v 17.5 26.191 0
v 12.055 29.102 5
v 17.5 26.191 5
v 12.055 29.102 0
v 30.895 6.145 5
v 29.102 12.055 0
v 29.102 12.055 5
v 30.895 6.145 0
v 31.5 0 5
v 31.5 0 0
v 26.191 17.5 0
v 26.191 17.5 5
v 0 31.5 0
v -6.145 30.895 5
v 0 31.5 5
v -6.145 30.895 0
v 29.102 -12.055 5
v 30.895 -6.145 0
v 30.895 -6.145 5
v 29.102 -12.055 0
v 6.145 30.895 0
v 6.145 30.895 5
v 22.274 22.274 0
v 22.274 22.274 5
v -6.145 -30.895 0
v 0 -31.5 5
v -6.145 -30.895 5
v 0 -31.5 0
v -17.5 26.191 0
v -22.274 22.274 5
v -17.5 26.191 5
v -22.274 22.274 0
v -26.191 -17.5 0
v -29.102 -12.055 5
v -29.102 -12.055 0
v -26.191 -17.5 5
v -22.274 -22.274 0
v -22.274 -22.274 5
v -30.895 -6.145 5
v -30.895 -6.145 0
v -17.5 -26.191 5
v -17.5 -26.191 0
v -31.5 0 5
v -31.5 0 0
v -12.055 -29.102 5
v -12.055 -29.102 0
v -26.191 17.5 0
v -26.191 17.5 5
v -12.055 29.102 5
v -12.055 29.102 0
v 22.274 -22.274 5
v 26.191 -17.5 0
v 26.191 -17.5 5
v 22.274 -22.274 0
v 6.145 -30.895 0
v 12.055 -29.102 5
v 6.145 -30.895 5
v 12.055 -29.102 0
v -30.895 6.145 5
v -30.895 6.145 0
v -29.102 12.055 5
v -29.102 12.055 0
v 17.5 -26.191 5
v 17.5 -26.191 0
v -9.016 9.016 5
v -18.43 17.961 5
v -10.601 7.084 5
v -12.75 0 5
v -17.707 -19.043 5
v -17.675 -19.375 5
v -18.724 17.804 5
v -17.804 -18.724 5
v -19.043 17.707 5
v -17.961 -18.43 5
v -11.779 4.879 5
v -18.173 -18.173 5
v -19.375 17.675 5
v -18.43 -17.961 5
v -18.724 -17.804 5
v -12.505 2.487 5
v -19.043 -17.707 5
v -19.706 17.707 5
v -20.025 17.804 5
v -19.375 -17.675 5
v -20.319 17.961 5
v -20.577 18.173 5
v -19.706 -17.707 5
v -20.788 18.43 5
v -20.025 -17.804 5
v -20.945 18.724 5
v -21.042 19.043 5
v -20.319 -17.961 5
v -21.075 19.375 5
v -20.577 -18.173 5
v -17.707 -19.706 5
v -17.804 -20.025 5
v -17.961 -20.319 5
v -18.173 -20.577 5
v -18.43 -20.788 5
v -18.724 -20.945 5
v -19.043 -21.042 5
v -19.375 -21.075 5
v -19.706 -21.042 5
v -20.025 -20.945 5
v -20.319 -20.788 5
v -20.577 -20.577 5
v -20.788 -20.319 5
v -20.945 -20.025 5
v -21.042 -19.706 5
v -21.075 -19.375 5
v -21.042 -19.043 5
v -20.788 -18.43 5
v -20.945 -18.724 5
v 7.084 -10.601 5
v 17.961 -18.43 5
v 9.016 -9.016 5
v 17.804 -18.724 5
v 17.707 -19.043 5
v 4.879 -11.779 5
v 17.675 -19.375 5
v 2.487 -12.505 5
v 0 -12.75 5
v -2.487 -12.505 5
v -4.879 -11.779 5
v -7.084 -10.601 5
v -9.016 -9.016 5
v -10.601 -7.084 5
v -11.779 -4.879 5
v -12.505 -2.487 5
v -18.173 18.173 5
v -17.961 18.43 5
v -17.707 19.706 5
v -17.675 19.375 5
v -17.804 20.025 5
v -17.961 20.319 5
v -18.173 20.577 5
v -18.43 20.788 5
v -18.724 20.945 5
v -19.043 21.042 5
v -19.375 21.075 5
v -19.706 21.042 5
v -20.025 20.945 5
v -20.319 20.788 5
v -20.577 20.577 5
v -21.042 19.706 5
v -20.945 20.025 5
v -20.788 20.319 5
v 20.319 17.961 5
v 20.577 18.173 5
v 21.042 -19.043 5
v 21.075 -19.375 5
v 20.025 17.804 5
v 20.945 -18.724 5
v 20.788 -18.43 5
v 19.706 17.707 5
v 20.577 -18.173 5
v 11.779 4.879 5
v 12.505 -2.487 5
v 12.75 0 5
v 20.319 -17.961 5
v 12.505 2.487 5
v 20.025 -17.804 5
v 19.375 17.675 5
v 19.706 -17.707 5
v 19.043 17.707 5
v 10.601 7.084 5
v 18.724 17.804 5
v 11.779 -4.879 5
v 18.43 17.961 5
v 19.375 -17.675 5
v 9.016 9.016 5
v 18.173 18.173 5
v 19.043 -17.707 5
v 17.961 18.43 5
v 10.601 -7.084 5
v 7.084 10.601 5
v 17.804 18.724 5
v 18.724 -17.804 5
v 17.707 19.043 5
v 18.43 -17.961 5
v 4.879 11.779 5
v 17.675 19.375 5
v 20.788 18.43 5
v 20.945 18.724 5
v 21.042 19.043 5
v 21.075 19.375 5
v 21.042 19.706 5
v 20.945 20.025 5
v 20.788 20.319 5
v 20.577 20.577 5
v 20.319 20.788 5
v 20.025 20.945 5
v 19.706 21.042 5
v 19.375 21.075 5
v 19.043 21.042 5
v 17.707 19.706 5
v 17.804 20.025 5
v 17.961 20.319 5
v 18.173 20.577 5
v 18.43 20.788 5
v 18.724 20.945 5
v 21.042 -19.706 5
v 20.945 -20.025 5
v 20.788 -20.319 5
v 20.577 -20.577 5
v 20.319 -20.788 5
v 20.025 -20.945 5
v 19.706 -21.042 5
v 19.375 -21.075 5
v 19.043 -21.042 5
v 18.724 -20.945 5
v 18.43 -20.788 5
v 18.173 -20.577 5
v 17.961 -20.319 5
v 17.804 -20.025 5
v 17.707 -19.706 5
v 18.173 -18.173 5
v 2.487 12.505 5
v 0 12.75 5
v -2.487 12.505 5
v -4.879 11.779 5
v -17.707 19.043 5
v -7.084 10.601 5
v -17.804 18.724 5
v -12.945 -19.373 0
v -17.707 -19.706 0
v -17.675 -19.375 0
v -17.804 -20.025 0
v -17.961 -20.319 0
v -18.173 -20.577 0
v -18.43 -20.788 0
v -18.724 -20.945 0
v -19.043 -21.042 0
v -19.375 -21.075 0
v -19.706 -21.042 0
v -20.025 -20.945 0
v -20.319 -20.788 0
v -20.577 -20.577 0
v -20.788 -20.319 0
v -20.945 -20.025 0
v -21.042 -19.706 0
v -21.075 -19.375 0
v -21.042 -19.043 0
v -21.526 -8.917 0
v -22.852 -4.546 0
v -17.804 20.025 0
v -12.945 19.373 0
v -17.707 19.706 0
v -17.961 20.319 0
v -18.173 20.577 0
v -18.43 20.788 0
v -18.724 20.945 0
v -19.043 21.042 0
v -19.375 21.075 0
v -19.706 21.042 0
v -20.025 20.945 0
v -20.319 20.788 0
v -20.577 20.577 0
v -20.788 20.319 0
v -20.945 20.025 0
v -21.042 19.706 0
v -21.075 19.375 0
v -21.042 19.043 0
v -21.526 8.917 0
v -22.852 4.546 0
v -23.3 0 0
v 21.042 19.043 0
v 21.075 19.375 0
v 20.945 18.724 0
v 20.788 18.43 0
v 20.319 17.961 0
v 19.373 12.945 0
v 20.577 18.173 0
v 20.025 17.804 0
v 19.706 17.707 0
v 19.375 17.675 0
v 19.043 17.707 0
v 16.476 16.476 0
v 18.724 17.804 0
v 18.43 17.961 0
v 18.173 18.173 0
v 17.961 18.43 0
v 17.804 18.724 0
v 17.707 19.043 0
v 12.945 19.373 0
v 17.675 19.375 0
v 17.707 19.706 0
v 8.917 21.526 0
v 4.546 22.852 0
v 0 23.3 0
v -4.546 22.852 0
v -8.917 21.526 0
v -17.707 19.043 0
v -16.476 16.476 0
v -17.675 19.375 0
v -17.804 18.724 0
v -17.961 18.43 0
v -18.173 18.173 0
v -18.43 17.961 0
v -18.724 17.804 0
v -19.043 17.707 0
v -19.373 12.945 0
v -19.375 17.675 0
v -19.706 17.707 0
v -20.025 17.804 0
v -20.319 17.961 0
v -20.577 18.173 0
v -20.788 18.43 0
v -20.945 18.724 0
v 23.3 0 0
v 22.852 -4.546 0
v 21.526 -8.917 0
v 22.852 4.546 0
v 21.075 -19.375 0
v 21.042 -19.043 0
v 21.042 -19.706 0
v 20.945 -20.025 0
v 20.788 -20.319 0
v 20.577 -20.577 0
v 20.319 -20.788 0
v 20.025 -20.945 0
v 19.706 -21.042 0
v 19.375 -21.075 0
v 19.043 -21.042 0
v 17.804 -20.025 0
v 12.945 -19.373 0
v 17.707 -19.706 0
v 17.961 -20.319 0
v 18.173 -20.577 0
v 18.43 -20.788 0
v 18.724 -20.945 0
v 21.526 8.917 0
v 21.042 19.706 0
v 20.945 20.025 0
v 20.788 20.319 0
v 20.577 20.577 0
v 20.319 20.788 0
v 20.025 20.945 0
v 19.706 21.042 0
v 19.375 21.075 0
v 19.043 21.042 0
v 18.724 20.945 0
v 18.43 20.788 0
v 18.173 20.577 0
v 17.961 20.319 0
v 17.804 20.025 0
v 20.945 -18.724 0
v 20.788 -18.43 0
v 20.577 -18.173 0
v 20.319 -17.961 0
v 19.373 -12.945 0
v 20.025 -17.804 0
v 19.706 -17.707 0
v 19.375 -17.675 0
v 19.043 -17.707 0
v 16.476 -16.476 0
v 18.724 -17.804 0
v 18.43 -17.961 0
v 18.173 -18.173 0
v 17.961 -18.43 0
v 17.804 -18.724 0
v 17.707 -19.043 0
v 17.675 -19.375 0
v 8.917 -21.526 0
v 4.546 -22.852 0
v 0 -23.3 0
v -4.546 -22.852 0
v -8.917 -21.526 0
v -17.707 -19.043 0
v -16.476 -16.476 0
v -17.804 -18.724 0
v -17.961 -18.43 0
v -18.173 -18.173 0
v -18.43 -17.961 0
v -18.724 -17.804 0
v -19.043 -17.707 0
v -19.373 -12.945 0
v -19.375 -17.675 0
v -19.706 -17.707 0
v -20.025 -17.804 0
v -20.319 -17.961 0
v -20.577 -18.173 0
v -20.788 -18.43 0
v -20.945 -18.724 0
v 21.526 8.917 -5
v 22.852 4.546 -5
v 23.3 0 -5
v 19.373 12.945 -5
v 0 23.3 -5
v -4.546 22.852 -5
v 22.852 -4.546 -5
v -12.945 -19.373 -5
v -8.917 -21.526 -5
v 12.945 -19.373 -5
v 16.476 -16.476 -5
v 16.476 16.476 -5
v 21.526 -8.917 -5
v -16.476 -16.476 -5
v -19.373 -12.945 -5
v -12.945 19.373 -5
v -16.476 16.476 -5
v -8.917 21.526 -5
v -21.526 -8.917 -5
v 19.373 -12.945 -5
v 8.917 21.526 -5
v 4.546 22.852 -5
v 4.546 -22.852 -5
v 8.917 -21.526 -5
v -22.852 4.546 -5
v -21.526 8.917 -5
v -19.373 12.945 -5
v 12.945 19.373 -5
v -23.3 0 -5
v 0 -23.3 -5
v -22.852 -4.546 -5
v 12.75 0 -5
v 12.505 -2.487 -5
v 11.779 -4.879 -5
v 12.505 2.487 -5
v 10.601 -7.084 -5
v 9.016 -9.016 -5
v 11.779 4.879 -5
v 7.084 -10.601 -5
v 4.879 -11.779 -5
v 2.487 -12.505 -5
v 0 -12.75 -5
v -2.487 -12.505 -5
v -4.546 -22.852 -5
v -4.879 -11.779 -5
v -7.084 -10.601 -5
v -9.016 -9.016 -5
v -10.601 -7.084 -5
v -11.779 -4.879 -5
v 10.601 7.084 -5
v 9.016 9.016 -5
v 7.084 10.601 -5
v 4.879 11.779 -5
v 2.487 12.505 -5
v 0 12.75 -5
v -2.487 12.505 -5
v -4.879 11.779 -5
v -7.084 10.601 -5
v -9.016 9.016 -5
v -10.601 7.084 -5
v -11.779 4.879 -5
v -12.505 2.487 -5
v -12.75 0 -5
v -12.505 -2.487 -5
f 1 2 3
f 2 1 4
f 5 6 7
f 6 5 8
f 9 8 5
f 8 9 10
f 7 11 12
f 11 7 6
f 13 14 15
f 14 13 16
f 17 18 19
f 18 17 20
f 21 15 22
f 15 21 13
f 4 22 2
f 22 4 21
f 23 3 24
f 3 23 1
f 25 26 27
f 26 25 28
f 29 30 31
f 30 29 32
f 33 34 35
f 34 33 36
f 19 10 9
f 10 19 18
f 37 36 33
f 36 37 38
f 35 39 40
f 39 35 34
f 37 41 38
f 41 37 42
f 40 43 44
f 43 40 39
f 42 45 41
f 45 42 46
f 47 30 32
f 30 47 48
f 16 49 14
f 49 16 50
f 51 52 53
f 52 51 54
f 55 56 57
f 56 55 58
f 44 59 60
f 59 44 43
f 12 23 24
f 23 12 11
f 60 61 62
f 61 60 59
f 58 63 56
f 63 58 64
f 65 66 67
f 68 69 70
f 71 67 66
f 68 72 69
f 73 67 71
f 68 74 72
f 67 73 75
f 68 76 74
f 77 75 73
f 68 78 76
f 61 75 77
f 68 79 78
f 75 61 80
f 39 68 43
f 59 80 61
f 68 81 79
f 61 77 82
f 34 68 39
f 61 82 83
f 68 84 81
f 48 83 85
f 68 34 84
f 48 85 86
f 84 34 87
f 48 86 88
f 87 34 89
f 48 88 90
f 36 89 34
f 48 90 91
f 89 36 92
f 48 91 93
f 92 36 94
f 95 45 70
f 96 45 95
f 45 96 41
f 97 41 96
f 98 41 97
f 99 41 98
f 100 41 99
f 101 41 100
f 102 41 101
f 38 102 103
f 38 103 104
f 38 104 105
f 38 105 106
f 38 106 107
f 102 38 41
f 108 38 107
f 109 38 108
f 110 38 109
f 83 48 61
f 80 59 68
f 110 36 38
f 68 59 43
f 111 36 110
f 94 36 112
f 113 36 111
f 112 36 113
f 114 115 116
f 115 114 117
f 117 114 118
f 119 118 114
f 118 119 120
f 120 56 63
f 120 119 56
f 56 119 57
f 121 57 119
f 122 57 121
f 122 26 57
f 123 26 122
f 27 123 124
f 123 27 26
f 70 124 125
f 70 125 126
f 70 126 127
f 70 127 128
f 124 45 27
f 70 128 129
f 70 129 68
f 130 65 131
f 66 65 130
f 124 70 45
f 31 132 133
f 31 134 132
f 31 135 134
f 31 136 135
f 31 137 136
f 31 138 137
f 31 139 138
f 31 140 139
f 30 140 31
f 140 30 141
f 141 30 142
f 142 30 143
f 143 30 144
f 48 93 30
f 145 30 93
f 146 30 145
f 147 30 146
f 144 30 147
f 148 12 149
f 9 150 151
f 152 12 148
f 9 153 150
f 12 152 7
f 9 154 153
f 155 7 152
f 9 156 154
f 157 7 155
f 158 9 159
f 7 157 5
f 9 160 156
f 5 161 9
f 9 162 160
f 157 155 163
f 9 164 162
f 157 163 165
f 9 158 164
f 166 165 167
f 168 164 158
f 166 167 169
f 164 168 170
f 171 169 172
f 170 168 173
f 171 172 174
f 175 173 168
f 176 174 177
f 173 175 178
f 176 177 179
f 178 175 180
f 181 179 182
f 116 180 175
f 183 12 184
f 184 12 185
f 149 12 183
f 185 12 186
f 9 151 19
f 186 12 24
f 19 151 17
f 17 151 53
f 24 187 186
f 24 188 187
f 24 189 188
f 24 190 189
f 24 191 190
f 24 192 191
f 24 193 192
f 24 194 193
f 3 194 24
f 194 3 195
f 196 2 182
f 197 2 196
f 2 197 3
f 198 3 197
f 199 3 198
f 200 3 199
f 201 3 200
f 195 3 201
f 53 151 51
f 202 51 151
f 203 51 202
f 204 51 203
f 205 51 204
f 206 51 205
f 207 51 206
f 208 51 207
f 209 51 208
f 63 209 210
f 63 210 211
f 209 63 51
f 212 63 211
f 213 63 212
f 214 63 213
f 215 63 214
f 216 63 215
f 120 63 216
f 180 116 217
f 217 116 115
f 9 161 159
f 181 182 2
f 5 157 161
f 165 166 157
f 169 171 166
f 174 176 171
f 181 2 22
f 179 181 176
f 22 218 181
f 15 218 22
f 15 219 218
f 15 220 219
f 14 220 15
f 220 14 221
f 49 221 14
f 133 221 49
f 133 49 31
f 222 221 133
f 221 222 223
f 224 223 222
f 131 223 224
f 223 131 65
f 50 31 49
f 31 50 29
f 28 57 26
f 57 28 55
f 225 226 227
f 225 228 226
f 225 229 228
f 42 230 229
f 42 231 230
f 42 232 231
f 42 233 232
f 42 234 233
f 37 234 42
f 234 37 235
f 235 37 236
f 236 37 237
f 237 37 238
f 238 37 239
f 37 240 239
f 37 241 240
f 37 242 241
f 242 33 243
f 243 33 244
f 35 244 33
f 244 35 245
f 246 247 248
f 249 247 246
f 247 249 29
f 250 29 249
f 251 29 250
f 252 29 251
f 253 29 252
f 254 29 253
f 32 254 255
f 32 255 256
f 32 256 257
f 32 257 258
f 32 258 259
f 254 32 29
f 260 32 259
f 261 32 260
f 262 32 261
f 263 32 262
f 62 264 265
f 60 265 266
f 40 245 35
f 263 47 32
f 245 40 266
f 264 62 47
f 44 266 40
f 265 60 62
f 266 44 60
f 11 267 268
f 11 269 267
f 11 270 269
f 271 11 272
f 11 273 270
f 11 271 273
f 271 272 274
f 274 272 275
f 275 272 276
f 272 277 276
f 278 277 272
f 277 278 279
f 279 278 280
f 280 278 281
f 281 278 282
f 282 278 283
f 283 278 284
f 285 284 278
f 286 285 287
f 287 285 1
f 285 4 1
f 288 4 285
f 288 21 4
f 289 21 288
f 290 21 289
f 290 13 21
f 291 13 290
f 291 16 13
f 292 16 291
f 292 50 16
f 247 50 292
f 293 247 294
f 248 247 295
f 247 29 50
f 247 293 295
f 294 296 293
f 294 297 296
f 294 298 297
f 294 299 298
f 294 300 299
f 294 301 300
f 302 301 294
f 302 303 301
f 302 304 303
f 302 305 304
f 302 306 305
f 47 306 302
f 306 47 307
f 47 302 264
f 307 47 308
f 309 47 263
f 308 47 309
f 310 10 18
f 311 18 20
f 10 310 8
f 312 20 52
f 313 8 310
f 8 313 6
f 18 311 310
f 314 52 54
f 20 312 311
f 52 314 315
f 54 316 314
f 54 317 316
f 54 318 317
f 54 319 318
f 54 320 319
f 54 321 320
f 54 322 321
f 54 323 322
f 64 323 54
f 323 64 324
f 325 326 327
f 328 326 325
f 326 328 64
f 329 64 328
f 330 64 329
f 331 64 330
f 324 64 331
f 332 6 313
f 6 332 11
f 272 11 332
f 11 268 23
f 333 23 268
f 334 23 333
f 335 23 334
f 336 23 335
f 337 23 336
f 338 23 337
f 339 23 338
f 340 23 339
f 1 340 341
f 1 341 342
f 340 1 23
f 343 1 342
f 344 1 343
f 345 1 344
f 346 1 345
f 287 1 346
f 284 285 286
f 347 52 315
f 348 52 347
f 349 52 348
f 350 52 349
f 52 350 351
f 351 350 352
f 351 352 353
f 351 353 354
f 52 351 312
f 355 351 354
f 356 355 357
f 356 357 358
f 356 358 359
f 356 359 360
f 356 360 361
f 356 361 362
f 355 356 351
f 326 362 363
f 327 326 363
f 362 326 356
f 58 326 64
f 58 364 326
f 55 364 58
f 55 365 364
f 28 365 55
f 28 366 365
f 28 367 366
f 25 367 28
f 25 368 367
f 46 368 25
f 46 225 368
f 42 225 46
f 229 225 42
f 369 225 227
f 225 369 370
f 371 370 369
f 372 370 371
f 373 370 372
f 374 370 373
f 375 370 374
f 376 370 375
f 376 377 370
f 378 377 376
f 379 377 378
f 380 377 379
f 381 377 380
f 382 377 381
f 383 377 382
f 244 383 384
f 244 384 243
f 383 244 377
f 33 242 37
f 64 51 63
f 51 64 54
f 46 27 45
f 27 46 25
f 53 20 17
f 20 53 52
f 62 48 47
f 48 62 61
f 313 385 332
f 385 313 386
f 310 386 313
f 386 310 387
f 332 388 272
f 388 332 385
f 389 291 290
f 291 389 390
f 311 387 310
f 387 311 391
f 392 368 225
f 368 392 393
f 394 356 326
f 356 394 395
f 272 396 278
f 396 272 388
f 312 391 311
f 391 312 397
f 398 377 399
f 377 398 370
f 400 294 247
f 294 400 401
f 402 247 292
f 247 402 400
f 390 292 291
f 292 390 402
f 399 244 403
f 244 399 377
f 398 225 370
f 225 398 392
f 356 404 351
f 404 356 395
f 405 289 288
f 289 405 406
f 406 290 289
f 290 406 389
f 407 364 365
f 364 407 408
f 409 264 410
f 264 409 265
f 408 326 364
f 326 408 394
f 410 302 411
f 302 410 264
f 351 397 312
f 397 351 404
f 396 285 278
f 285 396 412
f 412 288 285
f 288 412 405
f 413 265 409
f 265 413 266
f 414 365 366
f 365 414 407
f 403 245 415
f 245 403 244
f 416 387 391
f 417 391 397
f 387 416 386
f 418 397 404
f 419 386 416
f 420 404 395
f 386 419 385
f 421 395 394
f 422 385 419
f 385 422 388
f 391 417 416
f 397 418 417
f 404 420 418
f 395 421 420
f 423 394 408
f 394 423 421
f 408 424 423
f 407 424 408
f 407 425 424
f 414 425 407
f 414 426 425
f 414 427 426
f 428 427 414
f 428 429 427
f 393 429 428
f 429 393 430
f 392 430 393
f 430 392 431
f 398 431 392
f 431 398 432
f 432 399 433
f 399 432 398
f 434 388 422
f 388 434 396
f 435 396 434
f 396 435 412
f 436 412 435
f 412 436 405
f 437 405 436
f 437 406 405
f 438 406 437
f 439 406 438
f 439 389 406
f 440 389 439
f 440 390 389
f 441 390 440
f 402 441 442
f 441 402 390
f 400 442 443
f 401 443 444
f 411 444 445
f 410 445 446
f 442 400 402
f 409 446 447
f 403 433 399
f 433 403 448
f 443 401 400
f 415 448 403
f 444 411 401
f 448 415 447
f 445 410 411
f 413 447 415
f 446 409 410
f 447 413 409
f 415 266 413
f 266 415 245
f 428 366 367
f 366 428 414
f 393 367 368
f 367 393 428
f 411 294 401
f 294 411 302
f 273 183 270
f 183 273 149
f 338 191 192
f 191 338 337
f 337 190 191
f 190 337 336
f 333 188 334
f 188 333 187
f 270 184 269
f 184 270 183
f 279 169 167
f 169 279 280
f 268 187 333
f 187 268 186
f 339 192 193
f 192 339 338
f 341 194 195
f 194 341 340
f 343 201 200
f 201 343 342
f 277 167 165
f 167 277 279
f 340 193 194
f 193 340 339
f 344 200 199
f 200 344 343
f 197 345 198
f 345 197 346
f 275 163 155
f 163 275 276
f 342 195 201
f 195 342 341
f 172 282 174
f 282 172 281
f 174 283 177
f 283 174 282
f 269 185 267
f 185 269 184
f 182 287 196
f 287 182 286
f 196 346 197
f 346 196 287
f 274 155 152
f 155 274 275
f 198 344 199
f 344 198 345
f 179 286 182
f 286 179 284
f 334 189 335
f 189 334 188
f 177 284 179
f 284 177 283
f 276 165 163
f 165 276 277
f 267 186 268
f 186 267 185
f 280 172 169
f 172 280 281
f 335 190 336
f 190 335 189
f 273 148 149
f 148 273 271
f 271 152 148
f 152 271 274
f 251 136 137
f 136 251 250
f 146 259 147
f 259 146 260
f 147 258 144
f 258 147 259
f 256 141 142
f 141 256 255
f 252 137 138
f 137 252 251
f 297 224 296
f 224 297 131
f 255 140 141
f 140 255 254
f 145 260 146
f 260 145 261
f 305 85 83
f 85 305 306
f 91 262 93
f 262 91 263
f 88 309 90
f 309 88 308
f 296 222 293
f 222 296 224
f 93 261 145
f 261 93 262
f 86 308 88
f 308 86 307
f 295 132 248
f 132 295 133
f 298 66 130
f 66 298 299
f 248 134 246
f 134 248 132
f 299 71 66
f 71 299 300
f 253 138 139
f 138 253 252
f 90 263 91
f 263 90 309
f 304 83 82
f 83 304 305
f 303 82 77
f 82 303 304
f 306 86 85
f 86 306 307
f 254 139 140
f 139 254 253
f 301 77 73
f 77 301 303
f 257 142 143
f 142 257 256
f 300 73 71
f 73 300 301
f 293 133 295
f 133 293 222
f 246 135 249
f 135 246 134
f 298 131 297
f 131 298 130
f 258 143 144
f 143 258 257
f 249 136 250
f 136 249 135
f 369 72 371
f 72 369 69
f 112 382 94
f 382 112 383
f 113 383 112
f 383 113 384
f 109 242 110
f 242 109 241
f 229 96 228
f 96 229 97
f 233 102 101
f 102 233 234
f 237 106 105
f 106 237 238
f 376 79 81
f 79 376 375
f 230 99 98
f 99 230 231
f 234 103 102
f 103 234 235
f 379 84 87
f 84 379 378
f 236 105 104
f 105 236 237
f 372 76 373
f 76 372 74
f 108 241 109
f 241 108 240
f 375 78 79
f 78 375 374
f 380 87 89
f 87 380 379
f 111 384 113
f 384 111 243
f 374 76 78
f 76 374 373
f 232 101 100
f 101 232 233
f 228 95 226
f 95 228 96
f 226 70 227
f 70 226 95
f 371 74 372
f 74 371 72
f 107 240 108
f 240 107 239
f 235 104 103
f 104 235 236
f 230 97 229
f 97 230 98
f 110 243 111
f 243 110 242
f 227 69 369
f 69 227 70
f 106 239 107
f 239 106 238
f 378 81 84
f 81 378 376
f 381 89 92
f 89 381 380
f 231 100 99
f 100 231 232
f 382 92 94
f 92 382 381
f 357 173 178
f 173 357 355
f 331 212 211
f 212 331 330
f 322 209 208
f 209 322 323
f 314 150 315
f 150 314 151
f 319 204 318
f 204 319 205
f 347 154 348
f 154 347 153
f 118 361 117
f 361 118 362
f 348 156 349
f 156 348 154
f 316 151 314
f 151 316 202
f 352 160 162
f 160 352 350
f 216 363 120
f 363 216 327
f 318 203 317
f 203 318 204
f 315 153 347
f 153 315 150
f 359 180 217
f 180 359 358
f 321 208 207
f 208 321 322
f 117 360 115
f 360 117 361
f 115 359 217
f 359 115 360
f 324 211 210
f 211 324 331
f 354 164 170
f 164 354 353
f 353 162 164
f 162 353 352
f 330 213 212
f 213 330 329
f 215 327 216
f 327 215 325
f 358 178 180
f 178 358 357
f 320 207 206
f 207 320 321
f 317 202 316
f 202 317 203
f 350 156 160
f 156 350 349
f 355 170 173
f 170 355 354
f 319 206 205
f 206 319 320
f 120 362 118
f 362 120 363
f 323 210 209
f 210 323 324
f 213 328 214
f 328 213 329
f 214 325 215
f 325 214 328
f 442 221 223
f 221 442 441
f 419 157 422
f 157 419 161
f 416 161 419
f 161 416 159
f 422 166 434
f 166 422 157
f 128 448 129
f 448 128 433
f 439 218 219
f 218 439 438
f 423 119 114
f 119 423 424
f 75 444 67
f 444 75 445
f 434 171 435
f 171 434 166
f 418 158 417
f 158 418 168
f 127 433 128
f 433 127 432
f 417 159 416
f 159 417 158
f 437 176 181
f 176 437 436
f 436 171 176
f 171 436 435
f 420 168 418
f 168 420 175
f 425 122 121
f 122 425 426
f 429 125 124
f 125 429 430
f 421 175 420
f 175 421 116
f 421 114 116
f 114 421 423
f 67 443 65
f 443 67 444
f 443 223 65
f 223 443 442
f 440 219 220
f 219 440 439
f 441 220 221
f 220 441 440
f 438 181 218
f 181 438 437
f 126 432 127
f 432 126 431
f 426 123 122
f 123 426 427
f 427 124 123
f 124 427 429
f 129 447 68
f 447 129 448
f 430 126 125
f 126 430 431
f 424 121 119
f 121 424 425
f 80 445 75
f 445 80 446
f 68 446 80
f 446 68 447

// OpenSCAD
$fn = 32;

// ----------------------------------------------------------------------
// Retaining cap: 6005 cover, 63 mm, spigot 46.6 mm
// ----------------------------------------------------------------------

// --- parameters (mm) ---
cap_d = 63;               // cover diameter
cap_t = 5;                // cover thickness
lip_d = 46.6;             // spigot that enters the housing
lip_h = 5;                // spigot height
shaft_d = 25.5;           // shaft opening
bolt_d = 3.4;             // bolt clearance
bolt_r = 27.4;            // bolt circle radius

module cover() {
  cylinder(h = cap_t, d = cap_d);
}

module spigot() {
  /* sunk 1 mm into the cover; the spigot sets the overall height */
  translate([0, 0, -lip_h]) cylinder(h = lip_h + 1, d = lip_d);
}

difference() {
  union() {
    cover();
    spigot();
  }
  for (i = [0 : 3]) rotate([0, 0, 45 + i * 90]) translate([bolt_r, 0, -lip_h - 1])
    cylinder(h = lip_h + cap_t + 2, d = bolt_d);
  translate([0, 0, -lip_h - 1]) cylinder(h = lip_h + cap_t + 2, d = shaft_d);
}
